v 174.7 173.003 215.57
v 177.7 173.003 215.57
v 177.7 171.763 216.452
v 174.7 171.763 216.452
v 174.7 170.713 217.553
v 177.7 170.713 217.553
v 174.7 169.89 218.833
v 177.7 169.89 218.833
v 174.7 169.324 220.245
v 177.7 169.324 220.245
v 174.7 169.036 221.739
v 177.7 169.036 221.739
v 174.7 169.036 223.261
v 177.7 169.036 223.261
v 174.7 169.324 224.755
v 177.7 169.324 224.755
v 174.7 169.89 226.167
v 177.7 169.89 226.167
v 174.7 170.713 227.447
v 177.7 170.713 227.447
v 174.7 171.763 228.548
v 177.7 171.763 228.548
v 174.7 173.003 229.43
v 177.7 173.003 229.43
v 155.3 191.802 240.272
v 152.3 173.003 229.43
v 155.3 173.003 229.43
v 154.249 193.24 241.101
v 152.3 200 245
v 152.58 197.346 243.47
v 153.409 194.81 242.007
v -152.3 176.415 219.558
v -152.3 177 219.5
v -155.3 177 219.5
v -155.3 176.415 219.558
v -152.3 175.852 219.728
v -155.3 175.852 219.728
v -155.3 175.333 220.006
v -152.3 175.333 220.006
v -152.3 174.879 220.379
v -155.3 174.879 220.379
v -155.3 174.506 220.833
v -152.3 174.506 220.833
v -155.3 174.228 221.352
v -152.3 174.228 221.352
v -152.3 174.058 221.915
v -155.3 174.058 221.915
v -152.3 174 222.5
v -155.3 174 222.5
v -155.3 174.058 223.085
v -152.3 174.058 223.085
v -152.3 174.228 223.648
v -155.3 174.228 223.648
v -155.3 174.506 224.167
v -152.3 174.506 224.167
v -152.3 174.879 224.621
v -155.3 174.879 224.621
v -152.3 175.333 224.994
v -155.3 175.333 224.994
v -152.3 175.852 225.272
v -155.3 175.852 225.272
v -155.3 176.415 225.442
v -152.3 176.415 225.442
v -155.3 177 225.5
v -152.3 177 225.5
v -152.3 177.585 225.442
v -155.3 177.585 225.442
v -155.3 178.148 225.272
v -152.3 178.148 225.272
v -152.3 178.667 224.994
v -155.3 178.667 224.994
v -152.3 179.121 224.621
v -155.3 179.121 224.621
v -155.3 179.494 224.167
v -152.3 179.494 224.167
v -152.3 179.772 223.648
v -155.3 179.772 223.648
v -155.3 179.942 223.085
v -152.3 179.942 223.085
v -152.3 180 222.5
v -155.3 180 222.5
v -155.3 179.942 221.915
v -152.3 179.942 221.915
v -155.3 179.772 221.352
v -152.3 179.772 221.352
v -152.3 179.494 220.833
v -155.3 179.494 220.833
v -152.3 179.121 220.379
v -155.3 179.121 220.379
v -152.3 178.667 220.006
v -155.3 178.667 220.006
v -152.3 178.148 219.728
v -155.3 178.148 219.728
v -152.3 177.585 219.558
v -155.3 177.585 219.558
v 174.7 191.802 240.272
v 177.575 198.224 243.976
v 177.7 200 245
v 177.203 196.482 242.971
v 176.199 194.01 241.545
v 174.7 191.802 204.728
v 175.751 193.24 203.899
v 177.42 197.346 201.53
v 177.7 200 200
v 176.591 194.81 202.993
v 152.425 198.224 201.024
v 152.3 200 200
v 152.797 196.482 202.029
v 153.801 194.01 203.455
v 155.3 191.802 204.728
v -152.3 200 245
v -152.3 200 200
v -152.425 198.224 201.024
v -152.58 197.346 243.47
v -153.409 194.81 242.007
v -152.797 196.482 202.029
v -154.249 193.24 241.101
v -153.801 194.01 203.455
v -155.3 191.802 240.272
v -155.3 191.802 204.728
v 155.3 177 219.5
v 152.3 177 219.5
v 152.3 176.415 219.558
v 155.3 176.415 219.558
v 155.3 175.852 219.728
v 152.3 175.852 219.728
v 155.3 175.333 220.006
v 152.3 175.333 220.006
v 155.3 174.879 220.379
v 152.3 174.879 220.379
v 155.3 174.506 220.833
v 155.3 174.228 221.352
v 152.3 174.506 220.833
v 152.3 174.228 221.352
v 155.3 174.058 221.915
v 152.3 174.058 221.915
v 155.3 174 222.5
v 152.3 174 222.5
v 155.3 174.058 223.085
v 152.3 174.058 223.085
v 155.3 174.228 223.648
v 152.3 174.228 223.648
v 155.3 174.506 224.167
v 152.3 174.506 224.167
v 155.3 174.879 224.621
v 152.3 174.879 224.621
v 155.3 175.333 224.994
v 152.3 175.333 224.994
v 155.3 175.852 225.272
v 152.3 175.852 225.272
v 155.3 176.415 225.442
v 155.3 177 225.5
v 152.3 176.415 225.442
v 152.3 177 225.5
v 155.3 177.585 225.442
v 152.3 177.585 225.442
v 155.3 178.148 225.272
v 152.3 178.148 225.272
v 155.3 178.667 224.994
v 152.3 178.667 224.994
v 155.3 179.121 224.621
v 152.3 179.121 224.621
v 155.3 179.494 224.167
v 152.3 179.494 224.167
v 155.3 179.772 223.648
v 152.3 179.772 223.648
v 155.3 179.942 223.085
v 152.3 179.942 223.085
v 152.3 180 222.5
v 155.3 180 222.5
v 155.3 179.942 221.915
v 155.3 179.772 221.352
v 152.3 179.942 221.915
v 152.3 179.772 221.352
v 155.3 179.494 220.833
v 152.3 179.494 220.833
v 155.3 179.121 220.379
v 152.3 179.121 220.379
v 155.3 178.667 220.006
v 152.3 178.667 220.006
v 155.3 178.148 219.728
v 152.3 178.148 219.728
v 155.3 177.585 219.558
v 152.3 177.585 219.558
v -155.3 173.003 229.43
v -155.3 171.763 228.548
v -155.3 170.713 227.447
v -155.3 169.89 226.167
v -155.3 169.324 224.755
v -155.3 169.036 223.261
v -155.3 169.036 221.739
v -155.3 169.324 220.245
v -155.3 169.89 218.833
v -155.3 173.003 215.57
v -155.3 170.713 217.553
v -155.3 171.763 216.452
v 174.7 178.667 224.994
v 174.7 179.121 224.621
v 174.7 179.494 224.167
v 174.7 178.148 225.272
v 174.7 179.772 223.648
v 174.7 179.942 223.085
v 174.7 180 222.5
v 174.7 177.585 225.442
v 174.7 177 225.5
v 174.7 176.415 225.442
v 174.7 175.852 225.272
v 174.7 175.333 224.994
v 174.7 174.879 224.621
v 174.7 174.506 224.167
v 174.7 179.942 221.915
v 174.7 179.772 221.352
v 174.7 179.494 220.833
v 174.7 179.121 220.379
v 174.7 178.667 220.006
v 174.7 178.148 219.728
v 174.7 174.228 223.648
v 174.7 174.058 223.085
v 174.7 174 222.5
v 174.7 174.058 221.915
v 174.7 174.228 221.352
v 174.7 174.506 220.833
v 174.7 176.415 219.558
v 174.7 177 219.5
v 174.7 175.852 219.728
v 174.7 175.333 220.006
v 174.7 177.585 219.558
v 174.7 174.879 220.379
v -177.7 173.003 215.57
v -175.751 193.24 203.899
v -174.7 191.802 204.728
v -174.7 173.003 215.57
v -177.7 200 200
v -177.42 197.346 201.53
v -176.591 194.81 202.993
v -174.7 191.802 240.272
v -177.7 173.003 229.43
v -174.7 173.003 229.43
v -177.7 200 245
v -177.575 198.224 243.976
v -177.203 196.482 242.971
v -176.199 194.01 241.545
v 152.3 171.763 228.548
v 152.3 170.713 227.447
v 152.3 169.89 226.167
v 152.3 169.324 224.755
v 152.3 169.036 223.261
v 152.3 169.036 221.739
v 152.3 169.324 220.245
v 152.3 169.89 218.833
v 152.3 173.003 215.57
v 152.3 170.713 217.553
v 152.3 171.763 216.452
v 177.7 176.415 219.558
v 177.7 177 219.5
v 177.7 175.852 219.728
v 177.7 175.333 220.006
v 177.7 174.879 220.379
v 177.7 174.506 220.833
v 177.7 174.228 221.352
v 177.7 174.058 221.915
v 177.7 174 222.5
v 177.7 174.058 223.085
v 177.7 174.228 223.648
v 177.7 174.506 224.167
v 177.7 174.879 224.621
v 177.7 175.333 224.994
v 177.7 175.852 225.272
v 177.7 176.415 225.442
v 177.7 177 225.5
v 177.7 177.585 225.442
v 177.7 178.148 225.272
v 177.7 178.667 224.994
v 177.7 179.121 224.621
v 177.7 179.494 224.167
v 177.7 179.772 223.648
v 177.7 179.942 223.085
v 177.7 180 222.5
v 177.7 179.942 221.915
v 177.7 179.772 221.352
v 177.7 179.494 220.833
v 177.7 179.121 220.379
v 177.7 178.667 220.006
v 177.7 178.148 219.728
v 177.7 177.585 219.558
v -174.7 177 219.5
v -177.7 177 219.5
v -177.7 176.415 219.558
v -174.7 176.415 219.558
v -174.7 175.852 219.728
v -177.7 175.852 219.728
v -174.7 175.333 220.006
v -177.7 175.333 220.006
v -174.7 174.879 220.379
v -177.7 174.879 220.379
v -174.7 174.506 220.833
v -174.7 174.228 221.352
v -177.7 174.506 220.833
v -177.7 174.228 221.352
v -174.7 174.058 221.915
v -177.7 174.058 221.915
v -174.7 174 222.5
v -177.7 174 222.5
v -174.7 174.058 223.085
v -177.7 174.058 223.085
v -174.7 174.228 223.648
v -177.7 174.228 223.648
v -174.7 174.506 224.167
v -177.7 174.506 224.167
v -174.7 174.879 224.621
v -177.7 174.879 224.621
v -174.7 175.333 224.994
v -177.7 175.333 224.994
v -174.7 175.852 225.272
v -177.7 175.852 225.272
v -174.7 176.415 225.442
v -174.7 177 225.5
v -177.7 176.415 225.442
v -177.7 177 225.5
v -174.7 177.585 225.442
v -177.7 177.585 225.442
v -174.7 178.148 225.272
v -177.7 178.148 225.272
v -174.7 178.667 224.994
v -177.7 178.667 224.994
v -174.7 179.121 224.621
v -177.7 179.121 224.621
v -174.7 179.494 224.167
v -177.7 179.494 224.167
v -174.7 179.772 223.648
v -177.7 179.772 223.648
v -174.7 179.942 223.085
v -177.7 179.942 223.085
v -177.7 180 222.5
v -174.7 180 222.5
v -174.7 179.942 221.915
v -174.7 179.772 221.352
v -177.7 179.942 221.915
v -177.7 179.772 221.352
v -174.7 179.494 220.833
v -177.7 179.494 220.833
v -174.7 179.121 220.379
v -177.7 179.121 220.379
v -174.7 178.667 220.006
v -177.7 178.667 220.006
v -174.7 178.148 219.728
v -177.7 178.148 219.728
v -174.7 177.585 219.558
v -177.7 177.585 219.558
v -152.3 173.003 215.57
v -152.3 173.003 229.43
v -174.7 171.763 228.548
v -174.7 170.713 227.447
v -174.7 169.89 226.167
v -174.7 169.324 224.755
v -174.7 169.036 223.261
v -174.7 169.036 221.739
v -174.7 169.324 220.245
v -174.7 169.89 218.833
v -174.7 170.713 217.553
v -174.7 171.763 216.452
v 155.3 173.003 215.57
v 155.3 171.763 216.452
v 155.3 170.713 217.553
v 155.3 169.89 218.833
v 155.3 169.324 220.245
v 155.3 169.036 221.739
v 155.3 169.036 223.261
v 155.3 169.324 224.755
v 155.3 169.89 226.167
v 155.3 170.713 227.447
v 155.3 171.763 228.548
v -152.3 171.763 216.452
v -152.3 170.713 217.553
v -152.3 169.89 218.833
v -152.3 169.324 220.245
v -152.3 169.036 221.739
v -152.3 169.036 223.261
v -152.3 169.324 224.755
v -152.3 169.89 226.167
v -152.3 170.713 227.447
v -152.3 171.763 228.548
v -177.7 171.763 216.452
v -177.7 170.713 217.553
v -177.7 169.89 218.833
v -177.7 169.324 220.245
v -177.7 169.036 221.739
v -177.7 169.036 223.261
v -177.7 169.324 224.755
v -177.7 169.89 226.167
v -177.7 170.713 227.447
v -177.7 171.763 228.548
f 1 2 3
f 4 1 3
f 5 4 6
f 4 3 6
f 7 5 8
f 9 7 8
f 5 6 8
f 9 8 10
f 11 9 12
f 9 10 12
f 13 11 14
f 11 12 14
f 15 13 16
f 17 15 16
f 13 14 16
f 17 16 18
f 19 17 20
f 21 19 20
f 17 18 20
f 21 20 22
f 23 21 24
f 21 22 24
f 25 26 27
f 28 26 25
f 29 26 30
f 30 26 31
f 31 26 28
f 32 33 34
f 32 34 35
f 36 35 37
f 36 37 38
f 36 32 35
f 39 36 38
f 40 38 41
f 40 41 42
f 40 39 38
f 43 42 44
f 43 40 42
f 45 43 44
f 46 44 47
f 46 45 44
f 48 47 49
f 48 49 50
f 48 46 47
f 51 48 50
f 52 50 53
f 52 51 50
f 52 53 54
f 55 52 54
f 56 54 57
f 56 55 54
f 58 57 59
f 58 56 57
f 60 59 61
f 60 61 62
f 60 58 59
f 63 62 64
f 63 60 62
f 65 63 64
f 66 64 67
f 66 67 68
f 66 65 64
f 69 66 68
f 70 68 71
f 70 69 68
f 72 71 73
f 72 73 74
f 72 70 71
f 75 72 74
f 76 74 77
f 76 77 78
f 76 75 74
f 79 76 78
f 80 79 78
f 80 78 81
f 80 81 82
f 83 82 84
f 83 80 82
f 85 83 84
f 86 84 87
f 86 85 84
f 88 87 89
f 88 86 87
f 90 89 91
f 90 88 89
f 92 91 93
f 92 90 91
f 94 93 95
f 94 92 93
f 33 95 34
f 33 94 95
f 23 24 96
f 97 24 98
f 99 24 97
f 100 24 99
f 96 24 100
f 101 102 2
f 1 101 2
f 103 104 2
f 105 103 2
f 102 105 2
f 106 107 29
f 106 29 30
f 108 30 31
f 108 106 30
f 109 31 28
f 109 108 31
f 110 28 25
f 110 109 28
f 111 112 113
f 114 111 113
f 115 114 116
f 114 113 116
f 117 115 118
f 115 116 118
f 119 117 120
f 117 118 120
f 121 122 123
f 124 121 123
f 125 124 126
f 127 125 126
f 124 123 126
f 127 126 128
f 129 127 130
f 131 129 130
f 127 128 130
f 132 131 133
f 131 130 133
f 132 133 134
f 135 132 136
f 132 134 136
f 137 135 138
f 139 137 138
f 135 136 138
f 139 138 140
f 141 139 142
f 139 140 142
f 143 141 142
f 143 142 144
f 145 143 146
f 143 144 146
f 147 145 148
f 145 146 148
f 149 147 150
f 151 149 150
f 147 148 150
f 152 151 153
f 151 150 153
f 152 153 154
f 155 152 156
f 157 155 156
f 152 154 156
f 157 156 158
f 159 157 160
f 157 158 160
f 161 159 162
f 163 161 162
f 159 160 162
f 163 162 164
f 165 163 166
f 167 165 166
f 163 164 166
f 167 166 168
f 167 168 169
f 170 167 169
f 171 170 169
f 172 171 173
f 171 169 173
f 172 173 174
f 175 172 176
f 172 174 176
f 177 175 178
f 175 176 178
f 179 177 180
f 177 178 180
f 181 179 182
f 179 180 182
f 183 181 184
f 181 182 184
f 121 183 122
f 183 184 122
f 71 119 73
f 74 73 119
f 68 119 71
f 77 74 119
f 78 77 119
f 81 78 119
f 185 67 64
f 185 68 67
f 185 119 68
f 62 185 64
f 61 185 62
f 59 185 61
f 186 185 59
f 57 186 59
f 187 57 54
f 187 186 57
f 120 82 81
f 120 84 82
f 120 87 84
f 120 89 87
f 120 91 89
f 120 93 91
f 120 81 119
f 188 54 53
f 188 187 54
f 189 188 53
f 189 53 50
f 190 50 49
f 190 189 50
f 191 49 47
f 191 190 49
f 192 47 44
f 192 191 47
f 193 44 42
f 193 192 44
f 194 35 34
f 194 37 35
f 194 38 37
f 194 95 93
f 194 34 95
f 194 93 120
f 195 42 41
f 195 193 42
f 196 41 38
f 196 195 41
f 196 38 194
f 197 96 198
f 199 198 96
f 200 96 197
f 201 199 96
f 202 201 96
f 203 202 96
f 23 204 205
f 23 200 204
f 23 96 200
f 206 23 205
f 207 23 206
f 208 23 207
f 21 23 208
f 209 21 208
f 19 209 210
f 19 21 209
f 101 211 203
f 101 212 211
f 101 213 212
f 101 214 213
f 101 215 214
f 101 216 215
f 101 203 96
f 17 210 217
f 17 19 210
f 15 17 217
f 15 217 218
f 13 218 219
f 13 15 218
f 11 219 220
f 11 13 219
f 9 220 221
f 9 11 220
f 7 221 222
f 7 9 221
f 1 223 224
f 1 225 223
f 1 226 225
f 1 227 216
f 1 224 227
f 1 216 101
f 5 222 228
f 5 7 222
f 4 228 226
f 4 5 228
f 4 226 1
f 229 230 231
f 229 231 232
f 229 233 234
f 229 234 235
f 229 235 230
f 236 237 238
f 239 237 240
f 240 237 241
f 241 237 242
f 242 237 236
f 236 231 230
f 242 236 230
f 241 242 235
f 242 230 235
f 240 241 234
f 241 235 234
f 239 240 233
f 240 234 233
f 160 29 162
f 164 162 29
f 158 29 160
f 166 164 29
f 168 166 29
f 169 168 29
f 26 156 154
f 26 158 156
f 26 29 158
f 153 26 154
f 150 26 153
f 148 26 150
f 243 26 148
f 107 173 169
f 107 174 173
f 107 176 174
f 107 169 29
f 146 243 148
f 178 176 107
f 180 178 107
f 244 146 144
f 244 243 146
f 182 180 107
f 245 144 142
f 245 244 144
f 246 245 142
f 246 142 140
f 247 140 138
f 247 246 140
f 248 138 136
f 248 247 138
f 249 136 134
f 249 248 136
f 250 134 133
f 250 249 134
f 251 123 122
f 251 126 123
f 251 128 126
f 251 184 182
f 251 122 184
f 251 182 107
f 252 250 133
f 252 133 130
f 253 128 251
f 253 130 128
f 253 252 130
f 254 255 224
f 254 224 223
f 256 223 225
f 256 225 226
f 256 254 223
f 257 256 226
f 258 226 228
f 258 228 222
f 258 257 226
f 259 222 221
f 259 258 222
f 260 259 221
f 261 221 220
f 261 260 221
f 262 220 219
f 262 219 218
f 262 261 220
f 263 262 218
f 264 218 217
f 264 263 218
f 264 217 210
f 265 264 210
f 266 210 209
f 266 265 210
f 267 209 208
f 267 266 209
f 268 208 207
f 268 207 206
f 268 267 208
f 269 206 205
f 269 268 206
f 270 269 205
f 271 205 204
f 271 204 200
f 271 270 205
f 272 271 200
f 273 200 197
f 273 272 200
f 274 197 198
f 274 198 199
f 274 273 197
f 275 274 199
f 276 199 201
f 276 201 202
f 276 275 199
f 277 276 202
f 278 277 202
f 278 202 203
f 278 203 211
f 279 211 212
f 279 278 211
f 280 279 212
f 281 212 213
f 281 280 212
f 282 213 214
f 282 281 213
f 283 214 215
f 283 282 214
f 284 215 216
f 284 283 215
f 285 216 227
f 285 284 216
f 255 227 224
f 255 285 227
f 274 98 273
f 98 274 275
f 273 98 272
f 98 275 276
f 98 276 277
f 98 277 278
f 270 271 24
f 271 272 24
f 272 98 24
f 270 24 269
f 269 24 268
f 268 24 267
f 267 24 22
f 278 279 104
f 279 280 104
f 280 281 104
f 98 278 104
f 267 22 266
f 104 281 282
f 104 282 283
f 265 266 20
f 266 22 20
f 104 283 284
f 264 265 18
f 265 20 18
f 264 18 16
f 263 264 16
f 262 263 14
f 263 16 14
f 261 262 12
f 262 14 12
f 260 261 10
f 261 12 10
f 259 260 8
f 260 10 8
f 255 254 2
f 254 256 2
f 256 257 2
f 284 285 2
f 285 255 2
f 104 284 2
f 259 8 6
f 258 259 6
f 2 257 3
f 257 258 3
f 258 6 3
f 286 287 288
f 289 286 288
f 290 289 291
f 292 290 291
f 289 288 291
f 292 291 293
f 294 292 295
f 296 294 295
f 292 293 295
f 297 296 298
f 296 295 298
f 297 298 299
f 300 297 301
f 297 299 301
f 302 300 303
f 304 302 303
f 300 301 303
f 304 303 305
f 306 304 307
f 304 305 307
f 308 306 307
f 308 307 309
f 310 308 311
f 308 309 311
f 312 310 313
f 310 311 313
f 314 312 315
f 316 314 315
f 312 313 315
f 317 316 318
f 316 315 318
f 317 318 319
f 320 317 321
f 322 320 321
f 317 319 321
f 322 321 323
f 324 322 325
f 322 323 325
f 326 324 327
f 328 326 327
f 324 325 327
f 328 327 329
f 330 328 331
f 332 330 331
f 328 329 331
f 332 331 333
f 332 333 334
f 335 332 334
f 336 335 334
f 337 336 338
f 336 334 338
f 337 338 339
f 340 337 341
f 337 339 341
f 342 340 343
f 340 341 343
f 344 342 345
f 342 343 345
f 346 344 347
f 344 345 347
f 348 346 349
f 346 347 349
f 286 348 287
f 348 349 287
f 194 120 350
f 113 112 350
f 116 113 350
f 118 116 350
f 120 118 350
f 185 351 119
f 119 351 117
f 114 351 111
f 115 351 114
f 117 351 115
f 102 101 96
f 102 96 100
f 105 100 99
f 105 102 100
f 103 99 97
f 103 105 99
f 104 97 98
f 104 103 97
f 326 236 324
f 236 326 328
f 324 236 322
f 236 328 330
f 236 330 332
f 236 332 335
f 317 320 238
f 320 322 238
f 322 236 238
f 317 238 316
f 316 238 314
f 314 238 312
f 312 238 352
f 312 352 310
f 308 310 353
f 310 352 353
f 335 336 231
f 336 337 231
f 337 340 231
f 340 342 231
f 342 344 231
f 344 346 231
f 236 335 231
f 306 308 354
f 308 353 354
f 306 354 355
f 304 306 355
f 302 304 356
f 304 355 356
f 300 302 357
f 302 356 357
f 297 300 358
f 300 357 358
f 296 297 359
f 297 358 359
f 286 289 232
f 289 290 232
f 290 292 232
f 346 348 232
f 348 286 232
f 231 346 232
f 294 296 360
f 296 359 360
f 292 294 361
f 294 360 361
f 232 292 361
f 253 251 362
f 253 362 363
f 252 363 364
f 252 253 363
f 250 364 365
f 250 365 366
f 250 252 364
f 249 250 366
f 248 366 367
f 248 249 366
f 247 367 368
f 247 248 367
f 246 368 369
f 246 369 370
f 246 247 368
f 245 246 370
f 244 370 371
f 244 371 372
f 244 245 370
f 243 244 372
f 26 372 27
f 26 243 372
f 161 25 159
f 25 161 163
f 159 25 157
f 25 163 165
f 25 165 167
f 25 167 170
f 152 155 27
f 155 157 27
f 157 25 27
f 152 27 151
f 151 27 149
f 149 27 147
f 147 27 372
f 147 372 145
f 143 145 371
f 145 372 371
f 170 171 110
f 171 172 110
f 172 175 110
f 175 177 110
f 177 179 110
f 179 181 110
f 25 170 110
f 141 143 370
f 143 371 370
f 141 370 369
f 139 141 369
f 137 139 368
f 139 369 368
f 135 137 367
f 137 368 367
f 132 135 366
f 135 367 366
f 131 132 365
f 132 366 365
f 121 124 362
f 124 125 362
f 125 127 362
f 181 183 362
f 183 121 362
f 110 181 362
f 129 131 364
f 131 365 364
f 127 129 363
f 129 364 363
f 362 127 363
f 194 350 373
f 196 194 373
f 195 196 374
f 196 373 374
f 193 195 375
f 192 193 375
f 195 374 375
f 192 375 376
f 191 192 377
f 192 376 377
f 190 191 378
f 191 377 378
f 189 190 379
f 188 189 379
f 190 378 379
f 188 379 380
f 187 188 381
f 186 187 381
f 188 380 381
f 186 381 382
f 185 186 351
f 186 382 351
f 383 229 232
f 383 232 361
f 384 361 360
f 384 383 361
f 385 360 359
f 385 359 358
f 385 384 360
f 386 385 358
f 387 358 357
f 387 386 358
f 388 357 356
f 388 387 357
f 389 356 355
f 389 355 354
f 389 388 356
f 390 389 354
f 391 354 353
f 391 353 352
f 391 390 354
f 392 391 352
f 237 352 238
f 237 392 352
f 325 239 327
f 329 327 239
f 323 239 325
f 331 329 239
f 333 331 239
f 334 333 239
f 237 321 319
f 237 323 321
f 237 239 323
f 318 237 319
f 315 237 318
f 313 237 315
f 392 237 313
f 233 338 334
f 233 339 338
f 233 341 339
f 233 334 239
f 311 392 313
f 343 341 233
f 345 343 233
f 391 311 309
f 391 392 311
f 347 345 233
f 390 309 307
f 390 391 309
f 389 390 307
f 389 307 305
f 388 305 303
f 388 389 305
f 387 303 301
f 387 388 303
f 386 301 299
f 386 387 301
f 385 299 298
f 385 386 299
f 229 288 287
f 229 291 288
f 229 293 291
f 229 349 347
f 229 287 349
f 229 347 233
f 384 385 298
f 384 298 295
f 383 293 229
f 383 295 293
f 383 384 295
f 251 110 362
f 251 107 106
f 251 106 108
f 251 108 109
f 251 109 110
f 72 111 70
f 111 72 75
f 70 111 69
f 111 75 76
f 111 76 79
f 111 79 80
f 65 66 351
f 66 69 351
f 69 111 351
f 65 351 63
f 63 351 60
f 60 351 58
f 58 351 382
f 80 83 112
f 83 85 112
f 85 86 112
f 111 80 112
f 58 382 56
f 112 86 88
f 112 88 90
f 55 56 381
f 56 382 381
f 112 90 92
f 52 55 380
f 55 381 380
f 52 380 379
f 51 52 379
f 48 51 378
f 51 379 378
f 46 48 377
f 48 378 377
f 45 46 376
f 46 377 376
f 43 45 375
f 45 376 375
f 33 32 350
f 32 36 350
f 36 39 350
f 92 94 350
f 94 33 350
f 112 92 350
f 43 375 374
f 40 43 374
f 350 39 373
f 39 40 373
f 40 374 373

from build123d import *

# Parameters (mm, degrees)
F_3DSKETCH1_R       = 3
BOSS_EXTRUDE1_DEPTH = 3
INDENT1_START       = 199
INDENT1_DEPTH       = 47
INDENT1_START_2     = 200
INDENT1_2_DEPTH     = 45
INDENT1_START_3     = 174
INDENT1_3_DEPTH     = 3
INDENT2_START       = 199
INDENT2_DEPTH       = 47
INDENT2_START_2     = 200
INDENT2_2_DEPTH     = 45
INDENT2_START_3     = 153
INDENT2_3_DEPTH     = 3


with BuildPart() as part:
    # 3DSketch1 → Boss-Extrude1 (new body)
    with BuildSketch(Plane(origin=(152.3, 200, 245), x_dir=(0, 0, -1), z_dir=(-1, 0, 0))):
        with BuildLine():
            Line((0, 0), (45, 0))
            Line((45, 0), (29.430054259, 26.99679221))
            ThreePointArc((29.430054259, 26.99679221), (22.5, 31), (15.569945741, 26.99679221))
            Line((15.569945741, 26.99679221), (0, 0))
        make_face()
        with Locations((22.5, 23)):
            Circle(F_3DSKETCH1_R, mode=Mode.SUBTRACT)
    extrude(amount=-BOSS_EXTRUDE1_DEPTH)


with BuildPart() as body_2:
    # Mirror1: mirrored copy
    add(part.part.mirror(Plane(origin=(165, 0, 0), x_dir=(0, 0, 1), z_dir=(1, 0, 0))))

    # Indent1: read off the stored shape, not the designer's step
    # Indent1 outline → Indent1 (cut)
    with BuildSketch(Plane.XY.offset(INDENT1_START)):
        with BuildLine():
            Line((174.7, 200), (174.7, 191.802439387))
            ThreePointArc((174.7, 191.802439387), (176.926441213, 195.635369431), (177.7, 200))
            Line((177.7, 200), (174.7, 200))
        make_face()
    extrude(amount=INDENT1_DEPTH, mode=Mode.SUBTRACT)


with BuildPart() as body_3:
    # Indent1 2 outline → Indent1 2 (new body)
    with BuildSketch(Plane.XY.offset(INDENT1_START_2)):
        with BuildLine():
            Line((176.4, 200), (174.7, 200))
            Line((174.7, 200), (174.7, 194.010843131))
            ThreePointArc((174.7, 194.010843131), (175.966767983, 196.887123517), (176.4, 200))
        make_face()
    extrude(amount=INDENT1_2_DEPTH)

    # Indent1 3 outline → Indent1 3 (cut)
    with BuildSketch(Plane.YZ.offset(INDENT1_START_3)):
        Polygon((200, 200), (194.010843131, 203.454145469), (193, 204.037132239), (193, 200), align=None)
        Polygon((193, 245), (193, 240.962867761), (194.010843131, 241.545854531), (200, 245), align=None)
    extrude(amount=INDENT1_3_DEPTH, mode=Mode.SUBTRACT)


with BuildPart() as part_1:
    add(part.part)

    # Indent2: read off the stored shape, not the designer's step
    # Indent2 outline → Indent2 (cut)
    with BuildSketch(Plane.XY.offset(INDENT2_START)):
        with BuildLine():
            Line((155.3, 200), (152.3, 200))
            ThreePointArc((152.3, 200), (153.073558787, 195.635369431), (155.3, 191.802439387))
            Line((155.3, 191.802439387), (155.3, 200))
        make_face()
    extrude(amount=INDENT2_DEPTH, mode=Mode.SUBTRACT)


with BuildPart() as body_4:
    # Indent2 2 outline → Indent2 2 (new body)
    with BuildSketch(Plane.XY.offset(INDENT2_START_2)):
        with BuildLine():
            Line((155.3, 200), (153.6, 200))
            ThreePointArc((153.6, 200), (154.033232017, 196.887123517), (155.3, 194.010843131))
            Line((155.3, 194.010843131), (155.3, 200))
        make_face()
    extrude(amount=INDENT2_2_DEPTH)

    # Indent2 3 outline → Indent2 3 (cut)
    with BuildSketch(Plane.YZ.offset(INDENT2_START_3)):
        Polygon((194.010843131, 241.545854531), (200, 245), (193, 245), (193, 240.962867761), align=None)
        Polygon((194.010843131, 203.454145469), (193, 204.037132239), (193, 200), (200, 200), align=None)
    extrude(amount=INDENT2_3_DEPTH, mode=Mode.SUBTRACT)


with BuildPart() as body_3_2:
    # Mirror2: mirrored copy
    add(body_2.part.mirror(Plane(origin=(0, 0, 0), x_dir=(0, 0, 1), z_dir=(1, 0, 0))))


with BuildPart() as body_4_2:
    # Mirror2 2: mirrored copy
    add(part_1.part.mirror(Plane(origin=(0, 0, 0), x_dir=(0, 0, 1), z_dir=(1, 0, 0))))


solid = Compound([body_2.part, part_1.part, body_3_2.part, body_4_2.part])
